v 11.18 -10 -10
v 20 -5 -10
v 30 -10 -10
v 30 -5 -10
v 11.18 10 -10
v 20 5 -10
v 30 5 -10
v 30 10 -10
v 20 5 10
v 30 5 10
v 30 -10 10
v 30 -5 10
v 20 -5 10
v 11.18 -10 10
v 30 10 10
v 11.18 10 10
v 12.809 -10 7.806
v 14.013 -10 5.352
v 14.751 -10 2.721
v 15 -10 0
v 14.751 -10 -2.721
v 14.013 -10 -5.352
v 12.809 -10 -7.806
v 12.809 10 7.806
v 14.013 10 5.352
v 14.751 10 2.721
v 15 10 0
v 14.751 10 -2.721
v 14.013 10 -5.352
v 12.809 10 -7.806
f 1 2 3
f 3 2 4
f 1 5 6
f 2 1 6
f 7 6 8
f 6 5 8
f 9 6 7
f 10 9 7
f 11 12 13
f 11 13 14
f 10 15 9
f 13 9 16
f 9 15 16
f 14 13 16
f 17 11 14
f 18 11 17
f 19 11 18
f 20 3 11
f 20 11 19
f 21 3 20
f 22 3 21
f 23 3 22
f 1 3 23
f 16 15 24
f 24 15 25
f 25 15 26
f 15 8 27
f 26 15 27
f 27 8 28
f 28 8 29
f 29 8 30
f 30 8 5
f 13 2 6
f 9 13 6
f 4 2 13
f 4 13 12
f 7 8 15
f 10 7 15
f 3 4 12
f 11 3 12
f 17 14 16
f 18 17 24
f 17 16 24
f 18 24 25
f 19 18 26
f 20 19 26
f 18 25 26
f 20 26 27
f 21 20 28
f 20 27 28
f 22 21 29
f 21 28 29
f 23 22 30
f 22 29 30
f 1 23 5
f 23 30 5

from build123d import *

# Parameters (mm, degrees)
EXTRUDE_1_DEPTH          = 10
CUT_EXTRUDE_1_DEPTH      = 38.416573868
CUT_EXTRUDE_1_DEPTH_BACK = 38.416573868
SKETCH_3_W               = 15.208425039
SKETCH_3_H               = 10


with BuildPart() as part:
    # 草图2 → 凸台-拉伸1 (new, symmetric)
    with BuildSketch(Plane(origin=(0, 0, 0), x_dir=(1, 0, 0), z_dir=(0, 1, 0))):
        with BuildLine():
            Line((11.180339887, 10), (30, 10))
            Line((30, 10), (30, -10))
            Line((30, -10), (11.180339887, -10))
            ThreePointArc((11.180339887, -10), (15, 0), (11.180339887, 10))
        make_face()
    extrude(amount=EXTRUDE_1_DEPTH, both=True)

    # 草图3 → 切除-拉伸1 (cut, two sides: drawn at the far end of the back side and taken through both)
    with BuildSketch(Plane.XY.offset(10).offset(-CUT_EXTRUDE_1_DEPTH_BACK)):
        with Locations((27.60421252, 0)):
            Rectangle(SKETCH_3_W, SKETCH_3_H)
    extrude(amount=CUT_EXTRUDE_1_DEPTH + CUT_EXTRUDE_1_DEPTH_BACK, mode=Mode.SUBTRACT)


solid = part.part
